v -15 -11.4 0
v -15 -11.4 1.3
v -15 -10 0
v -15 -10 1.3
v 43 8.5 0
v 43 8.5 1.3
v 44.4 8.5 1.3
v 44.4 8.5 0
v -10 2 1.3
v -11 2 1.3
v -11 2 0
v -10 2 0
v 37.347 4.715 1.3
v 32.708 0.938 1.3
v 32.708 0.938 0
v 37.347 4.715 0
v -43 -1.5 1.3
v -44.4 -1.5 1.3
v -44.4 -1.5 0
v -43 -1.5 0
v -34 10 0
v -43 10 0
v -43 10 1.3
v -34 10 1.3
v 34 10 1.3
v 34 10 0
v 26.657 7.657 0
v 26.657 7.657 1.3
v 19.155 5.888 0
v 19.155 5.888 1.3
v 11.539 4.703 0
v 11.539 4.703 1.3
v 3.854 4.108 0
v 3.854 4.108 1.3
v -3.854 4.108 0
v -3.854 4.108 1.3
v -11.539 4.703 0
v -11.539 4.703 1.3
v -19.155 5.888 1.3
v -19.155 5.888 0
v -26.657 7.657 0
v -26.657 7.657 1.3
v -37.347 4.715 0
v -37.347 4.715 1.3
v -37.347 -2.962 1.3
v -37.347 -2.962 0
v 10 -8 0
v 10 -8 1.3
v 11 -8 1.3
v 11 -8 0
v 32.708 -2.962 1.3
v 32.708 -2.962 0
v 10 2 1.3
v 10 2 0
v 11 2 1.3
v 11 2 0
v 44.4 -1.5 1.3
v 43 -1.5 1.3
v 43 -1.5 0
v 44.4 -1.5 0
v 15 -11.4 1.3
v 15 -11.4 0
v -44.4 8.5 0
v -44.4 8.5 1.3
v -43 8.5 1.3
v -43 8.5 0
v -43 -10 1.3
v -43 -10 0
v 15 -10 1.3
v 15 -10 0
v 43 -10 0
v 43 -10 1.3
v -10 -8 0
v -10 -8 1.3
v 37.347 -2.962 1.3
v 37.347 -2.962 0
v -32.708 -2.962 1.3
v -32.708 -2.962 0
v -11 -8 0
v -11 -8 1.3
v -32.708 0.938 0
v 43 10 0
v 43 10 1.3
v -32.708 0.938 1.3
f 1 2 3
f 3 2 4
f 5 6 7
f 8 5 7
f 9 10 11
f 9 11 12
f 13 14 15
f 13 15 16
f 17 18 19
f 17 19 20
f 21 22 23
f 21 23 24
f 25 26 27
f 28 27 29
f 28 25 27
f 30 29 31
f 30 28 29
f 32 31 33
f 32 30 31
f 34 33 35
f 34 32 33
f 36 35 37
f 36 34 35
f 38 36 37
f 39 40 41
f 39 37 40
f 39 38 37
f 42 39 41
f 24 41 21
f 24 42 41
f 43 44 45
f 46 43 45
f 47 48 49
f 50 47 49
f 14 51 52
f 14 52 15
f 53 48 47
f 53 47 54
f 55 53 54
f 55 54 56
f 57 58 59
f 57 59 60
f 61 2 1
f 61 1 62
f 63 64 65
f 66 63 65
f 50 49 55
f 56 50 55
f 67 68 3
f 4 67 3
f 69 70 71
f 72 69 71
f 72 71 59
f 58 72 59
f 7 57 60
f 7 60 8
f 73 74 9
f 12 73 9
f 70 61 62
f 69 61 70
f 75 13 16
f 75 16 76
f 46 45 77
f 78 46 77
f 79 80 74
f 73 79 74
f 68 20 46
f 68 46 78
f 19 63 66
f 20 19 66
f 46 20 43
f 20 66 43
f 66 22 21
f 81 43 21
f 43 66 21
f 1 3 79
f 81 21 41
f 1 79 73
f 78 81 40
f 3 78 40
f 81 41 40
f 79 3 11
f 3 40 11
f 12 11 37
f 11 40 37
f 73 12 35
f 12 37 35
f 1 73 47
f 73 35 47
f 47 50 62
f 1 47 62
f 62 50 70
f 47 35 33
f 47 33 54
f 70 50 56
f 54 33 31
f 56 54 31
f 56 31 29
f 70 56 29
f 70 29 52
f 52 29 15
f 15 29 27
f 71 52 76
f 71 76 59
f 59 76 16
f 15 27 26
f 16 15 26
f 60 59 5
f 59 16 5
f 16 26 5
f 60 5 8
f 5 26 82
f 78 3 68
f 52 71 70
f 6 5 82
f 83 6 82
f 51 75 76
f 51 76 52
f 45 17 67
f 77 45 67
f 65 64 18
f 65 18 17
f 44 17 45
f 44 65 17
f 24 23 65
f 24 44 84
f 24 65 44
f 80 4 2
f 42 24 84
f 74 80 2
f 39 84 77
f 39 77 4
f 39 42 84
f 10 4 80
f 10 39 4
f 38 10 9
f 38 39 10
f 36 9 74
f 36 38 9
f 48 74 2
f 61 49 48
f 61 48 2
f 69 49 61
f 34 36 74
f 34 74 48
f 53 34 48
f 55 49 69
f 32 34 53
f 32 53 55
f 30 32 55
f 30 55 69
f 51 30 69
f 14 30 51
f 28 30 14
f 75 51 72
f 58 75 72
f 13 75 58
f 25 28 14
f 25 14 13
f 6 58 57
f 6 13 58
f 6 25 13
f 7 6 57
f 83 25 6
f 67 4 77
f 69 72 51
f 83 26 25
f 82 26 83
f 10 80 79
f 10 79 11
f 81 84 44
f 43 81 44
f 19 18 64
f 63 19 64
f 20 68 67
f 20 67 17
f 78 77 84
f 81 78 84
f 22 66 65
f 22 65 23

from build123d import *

# Parameters (mm, degrees)
SKETCH1_W           = 86
SKETCH1_H           = 20
BOSS_EXTRUDE1_DEPTH = 1.3
SKETCH2_W           = 30
SKETCH2_H           = 1.4
SKETCH2_W_2         = 1.4
SKETCH2_H_2         = 10
BOSS_EXTRUDE2_DEPTH = 1.3
CUT_EXTRUDE1_DEPTH  = 46.858586982
SKETCH4_W           = 1
SKETCH4_H           = 10
CUT_EXTRUDE2_DEPTH  = 46.858586982
CUT_EXTRUDE3_DEPTH  = 46.858586982


with BuildPart() as part:
    # Sketch1 → Boss-Extrude1 (new body)
    with BuildSketch(Plane.XY):
        Rectangle(SKETCH1_W, SKETCH1_H)
    extrude(amount=BOSS_EXTRUDE1_DEPTH)

    # Sketch2 → Boss-Extrude2 (add)
    with BuildSketch(Plane.XY.offset(1.3)):
        with Locations((0, -10.7)):
            Rectangle(SKETCH2_W, SKETCH2_H)
        with Locations((-43.7, 3.5)):
            Rectangle(SKETCH2_W_2, SKETCH2_H_2)
        with Locations((43.7, 3.5)):
            Rectangle(SKETCH2_W_2, SKETCH2_H_2)
    extrude(amount=-BOSS_EXTRUDE2_DEPTH)

    # Sketch3 → Cut-Extrude1 (cut, through all)
    with BuildSketch(Plane.XY.offset(1.3)):
        with BuildLine():
            Line((-34, 10), (34, 10))
            ThreePointArc((34, 10), (0, 4.033829384), (-34, 10))
        make_face()
    extrude(amount=-CUT_EXTRUDE1_DEPTH, mode=Mode.SUBTRACT)

    # Sketch4 → Cut-Extrude2 (cut, through all)
    with BuildSketch(Plane.XY.offset(1.3)):
        with Locations((-10.5, -3)):
            Rectangle(SKETCH4_W, SKETCH4_H)
        with Locations((10.5, -3)):
            Rectangle(SKETCH4_W, SKETCH4_H)
    extrude(amount=-CUT_EXTRUDE2_DEPTH, mode=Mode.SUBTRACT)

    # Sketch5 → Cut-Extrude3 (cut, through all)
    with BuildSketch(Plane.XY.offset(1.3)):
        Polygon((-37.347292806, 4.71481035), (-37.347292806, -2.961858542), (-32.708450107, -2.961858542), (-32.708450107, 0.938053462), align=None)
        Polygon((32.708450107, -2.961858542), (32.708450107, 0.938053462), (37.347292806, 4.71481035), (37.347292806, -2.961858542), align=None)
    extrude(amount=-CUT_EXTRUDE3_DEPTH, mode=Mode.SUBTRACT)


solid = part.part
